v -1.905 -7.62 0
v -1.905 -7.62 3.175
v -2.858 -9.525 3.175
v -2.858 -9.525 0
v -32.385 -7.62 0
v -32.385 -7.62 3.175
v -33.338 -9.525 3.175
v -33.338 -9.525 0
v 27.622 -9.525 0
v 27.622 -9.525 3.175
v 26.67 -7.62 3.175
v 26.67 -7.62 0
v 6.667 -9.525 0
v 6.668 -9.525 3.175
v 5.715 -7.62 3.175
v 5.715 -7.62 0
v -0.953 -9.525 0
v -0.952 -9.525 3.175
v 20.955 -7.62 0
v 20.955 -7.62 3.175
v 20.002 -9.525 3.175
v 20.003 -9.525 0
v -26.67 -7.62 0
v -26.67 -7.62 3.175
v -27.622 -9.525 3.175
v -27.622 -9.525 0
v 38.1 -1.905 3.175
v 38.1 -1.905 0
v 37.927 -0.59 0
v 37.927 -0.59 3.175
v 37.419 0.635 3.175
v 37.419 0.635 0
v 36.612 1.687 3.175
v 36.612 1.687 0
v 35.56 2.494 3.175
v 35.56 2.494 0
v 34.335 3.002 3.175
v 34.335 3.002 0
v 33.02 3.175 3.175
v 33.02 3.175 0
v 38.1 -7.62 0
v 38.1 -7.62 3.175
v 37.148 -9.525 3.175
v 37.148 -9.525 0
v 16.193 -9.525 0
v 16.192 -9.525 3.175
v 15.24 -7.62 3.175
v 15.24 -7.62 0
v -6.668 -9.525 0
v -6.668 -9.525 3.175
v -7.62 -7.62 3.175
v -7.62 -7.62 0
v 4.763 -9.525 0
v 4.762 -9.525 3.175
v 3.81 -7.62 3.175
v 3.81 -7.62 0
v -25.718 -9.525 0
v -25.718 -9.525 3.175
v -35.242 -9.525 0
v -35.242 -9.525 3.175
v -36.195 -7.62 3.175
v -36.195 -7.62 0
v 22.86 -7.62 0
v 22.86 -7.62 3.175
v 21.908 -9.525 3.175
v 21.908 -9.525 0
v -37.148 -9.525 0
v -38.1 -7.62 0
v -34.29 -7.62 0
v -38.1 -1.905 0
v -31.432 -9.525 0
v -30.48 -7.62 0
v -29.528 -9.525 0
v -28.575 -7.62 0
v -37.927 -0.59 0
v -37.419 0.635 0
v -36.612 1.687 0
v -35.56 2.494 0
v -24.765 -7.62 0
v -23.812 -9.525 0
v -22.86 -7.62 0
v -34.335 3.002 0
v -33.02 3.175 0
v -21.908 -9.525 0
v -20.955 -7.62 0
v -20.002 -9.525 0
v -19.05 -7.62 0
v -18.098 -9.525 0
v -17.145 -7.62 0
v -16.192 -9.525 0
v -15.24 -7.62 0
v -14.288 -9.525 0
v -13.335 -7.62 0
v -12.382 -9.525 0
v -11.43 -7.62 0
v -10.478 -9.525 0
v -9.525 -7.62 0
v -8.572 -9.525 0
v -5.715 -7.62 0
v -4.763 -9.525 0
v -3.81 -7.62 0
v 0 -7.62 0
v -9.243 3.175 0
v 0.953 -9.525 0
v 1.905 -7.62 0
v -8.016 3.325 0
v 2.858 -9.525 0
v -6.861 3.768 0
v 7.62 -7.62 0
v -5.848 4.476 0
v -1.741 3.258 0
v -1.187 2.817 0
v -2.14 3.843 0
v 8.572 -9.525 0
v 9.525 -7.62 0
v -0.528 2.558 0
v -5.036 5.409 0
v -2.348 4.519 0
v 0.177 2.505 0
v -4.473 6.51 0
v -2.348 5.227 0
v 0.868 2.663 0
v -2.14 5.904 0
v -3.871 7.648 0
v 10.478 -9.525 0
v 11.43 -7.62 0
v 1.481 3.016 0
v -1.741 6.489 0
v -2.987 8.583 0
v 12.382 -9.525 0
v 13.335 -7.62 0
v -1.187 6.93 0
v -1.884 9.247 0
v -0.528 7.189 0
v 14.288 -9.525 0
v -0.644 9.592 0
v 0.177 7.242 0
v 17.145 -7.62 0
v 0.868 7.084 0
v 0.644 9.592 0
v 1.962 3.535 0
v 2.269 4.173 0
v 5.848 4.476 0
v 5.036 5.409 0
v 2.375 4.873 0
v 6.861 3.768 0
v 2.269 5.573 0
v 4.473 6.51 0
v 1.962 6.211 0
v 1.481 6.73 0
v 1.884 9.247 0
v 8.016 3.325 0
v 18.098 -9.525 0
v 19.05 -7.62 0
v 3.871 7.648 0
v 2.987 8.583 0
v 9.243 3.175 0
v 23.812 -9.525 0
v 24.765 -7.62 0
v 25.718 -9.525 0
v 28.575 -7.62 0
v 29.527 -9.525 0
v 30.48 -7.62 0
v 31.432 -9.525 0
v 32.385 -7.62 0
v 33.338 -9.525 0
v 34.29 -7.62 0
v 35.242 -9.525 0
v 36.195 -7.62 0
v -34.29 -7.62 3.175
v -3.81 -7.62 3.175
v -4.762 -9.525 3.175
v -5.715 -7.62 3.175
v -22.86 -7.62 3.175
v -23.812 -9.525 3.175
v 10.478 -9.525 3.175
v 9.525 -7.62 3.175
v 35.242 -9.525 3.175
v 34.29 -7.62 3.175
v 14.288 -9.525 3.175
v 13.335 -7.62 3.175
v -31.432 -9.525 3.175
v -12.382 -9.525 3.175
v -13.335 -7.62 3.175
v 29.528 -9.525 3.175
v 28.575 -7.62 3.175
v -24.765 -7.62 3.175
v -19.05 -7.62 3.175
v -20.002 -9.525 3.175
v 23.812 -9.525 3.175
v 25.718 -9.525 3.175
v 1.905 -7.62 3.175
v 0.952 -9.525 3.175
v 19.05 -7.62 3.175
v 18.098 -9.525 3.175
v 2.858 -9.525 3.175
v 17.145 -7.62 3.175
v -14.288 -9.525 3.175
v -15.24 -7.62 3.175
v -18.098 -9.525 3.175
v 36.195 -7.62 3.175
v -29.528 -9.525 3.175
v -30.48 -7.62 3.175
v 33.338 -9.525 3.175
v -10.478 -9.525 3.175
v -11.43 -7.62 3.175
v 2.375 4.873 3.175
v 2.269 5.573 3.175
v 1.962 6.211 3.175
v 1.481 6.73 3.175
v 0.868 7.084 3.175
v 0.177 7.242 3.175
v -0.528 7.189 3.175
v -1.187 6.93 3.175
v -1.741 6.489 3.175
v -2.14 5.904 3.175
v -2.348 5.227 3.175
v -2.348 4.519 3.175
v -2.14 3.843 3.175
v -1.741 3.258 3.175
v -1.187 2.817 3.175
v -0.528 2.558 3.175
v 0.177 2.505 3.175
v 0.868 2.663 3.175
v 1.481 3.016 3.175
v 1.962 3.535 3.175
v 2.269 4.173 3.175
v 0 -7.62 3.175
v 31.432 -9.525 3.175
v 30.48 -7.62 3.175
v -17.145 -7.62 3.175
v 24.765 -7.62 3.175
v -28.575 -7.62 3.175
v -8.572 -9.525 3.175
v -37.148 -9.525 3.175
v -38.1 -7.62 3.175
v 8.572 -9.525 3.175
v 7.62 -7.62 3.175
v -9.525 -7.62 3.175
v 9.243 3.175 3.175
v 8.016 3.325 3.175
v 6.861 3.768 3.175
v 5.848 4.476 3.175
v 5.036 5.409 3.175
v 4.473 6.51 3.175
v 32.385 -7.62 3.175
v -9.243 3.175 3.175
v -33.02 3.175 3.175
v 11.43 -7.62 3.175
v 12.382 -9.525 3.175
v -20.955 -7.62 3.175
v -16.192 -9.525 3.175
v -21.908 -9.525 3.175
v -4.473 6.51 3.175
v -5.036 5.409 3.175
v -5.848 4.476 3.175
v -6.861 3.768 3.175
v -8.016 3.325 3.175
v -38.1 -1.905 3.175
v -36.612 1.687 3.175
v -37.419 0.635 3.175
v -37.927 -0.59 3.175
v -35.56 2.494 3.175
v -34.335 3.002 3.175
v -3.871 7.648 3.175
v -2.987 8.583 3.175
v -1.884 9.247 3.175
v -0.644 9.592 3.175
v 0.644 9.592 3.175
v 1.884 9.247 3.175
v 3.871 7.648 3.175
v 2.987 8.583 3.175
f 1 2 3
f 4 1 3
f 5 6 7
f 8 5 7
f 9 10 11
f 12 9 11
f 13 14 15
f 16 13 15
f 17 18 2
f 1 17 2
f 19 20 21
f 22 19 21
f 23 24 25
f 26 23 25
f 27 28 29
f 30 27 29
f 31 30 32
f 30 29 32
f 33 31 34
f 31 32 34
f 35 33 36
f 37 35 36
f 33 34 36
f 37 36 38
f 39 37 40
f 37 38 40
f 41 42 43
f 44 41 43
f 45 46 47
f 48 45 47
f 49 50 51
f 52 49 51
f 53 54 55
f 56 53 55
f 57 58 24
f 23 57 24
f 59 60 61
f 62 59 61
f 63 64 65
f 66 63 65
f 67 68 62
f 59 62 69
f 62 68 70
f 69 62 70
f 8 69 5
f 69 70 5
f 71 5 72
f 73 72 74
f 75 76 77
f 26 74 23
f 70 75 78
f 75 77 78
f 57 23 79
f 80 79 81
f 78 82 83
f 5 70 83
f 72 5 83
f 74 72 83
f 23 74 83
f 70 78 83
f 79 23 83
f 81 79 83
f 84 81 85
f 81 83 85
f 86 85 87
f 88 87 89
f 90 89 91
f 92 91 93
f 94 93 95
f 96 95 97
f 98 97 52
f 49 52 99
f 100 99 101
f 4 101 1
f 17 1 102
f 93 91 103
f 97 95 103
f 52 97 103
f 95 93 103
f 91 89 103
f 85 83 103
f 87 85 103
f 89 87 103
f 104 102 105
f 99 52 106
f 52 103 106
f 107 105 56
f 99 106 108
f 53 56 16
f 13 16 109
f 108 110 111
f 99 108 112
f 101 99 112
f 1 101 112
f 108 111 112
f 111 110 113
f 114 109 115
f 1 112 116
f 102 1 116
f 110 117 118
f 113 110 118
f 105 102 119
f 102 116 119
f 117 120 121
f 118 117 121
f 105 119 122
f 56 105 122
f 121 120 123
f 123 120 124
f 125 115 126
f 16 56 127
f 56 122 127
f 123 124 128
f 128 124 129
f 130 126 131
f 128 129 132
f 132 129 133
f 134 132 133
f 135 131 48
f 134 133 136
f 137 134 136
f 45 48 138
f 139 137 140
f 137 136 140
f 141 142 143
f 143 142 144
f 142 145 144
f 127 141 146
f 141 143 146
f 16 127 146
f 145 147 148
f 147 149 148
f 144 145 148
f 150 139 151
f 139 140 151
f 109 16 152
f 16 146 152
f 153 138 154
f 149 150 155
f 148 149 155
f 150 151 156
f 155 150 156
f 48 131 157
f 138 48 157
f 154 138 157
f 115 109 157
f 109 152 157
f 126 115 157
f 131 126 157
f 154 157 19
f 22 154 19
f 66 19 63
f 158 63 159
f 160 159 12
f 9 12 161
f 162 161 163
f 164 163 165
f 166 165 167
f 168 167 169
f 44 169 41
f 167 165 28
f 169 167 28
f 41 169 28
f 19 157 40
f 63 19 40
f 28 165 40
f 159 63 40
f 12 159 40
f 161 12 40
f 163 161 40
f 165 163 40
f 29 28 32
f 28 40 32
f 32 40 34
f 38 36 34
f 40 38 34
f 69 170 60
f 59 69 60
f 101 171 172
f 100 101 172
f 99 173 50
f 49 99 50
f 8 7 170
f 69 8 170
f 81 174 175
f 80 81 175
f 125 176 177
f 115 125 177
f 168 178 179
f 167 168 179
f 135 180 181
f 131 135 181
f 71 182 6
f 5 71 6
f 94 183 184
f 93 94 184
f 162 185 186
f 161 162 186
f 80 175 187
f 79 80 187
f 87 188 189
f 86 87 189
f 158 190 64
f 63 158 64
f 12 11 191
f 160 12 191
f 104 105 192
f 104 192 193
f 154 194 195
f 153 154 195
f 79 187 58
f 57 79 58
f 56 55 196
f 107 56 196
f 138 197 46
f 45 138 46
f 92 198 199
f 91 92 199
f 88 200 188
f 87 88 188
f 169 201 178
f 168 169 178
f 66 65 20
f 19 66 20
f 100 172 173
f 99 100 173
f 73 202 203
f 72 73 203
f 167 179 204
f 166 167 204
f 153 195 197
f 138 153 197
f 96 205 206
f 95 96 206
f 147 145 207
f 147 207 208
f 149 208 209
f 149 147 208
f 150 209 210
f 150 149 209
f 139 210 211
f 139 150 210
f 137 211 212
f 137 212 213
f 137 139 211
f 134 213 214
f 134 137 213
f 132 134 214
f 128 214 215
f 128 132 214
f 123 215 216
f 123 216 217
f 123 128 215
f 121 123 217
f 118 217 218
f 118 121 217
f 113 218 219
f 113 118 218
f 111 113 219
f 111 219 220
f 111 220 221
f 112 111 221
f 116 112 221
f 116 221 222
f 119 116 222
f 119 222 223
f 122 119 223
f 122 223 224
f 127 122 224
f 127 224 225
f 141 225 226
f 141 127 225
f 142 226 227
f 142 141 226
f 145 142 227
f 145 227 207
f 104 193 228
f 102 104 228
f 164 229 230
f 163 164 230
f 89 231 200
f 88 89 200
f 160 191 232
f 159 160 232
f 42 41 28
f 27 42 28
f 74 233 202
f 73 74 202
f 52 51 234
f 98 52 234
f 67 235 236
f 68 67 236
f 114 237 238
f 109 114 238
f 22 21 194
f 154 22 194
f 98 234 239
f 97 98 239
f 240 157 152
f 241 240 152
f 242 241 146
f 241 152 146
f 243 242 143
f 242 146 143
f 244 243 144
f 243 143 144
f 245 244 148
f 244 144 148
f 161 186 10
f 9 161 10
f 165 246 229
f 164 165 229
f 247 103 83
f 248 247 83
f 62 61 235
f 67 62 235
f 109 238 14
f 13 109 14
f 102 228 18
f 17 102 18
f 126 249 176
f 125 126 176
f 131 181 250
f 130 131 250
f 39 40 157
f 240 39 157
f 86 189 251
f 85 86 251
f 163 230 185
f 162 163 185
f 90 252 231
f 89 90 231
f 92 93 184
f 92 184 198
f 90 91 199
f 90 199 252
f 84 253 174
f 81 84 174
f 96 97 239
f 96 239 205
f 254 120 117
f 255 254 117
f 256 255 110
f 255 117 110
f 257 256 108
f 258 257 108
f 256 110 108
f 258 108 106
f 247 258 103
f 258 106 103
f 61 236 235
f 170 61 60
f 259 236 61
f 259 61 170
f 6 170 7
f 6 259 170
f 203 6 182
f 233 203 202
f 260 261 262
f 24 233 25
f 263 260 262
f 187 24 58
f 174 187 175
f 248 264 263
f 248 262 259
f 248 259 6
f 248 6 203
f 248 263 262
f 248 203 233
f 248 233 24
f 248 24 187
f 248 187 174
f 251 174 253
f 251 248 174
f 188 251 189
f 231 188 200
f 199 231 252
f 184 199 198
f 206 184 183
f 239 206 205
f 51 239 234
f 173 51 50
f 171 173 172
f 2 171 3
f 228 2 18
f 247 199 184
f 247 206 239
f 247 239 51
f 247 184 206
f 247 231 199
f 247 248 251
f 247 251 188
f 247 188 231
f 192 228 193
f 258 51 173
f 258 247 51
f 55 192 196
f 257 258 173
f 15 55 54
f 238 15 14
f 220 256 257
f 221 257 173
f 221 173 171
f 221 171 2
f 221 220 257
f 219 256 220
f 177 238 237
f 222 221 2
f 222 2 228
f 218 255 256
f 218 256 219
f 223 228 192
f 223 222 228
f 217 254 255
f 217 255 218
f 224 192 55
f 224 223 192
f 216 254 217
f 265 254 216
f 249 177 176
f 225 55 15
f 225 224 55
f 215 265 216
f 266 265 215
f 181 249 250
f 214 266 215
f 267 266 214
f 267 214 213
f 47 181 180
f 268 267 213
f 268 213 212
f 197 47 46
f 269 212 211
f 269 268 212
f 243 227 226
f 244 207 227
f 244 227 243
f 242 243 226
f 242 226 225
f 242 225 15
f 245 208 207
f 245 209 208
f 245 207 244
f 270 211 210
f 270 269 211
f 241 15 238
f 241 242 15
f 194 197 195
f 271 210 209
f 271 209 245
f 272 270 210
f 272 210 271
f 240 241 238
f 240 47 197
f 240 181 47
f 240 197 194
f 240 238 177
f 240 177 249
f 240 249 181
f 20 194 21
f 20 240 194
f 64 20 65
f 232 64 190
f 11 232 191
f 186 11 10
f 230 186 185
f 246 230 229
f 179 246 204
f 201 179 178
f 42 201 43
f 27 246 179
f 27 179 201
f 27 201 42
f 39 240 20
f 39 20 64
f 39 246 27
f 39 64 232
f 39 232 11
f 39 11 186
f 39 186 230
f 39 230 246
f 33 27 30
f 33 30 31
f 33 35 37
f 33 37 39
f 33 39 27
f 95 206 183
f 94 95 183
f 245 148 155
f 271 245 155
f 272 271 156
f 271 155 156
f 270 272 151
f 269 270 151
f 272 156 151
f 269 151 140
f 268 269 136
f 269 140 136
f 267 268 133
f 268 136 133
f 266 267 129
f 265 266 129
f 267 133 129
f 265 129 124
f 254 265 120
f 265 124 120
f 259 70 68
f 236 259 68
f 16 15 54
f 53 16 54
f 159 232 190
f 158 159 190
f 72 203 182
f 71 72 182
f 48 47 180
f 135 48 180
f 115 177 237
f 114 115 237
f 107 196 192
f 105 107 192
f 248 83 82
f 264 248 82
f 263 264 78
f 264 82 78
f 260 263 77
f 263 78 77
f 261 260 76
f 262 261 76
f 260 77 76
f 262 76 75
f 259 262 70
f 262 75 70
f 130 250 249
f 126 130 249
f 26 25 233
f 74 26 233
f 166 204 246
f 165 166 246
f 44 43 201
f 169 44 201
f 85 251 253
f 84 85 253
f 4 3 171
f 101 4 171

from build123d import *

# Parameters (mm, degrees)
F0_R     = 2.3749
F1_DEPTH = 3.175
F3_DEPTH = 25.4


with BuildPart() as f1:
    # F0 (on Top) → F1 (new body)
    with BuildSketch(Plane.XY):
        with BuildLine():
            Line((-38.1, -9.525), (38.1, -9.525))
            Line((38.1, -9.525), (38.1, -1.905))
            ThreePointArc((38.1, -1.905), (36.612102, 1.687102), (33.02, 3.175))
            Line((33.02, 3.175), (9.243306, 3.175))
            ThreePointArc((9.243306, 3.175), (6.333003, 4.091283), (4.472567, 6.509591))
            ThreePointArc((4.472567, 6.509591), (0, 9.635769), (-4.472567, 6.509591))
            ThreePointArc((-4.472567, 6.509591), (-6.333003, 4.091283), (-9.243306, 3.175))
            Line((-9.243306, 3.175), (-33.02, 3.175))
            ThreePointArc((-33.02, 3.175), (-36.612102, 1.687102), (-38.1, -1.905))
            Line((-38.1, -1.905), (-38.1, -9.525))
        make_face()
        with Locations((0, 4.873269)):
            Circle(F0_R, mode=Mode.SUBTRACT)
    extrude(amount=F1_DEPTH)

    # F2 (on face) → F3 (cut)
    with BuildSketch(Plane.XY.offset(3.175)):
        Polygon((-38.1, -7.62), (-38.1, -14.148636), (38.1, -14.148636), (38.1, -7.62), (37.1475, -9.525), (36.195, -7.62), (35.2425, -9.525), (34.29, -7.62), (33.3375, -9.525), (32.385, -7.62), (31.4325, -9.525), (30.48, -7.62), (29.5275, -9.525), (28.575, -7.62), (27.6225, -9.525), (26.67, -7.62), (25.7175, -9.525), (24.765, -7.62), (23.8125, -9.525), (22.86, -7.62), (21.9075, -9.525), (20.955, -7.62), (20.0025, -9.525), (19.05, -7.62), (18.0975, -9.525), (17.145, -7.62), (16.1925, -9.525), (15.24, -7.62), (14.2875, -9.525), (13.335, -7.62), (12.3825, -9.525), (11.43, -7.62), (10.4775, -9.525), (9.525, -7.62), (8.5725, -9.525), (7.62, -7.62), (6.6675, -9.525), (5.715, -7.62), (4.7625, -9.525), (3.81, -7.62), (2.8575, -9.525), (1.905, -7.62), (0.9525, -9.525), (0, -7.62), (-0.9525, -9.525), (-1.905, -7.62), (-2.8575, -9.525), (-3.81, -7.62), (-4.7625, -9.525), (-5.715, -7.62), (-6.6675, -9.525), (-7.62, -7.62), (-8.5725, -9.525), (-9.525, -7.62), (-10.4775, -9.525), (-11.43, -7.62), (-12.3825, -9.525), (-13.335, -7.62), (-14.2875, -9.525), (-15.24, -7.62), (-16.1925, -9.525), (-17.145, -7.62), (-18.0975, -9.525), (-19.05, -7.62), (-20.0025, -9.525), (-20.955, -7.62), (-21.9075, -9.525), (-22.86, -7.62), (-23.8125, -9.525), (-24.765, -7.62), (-25.7175, -9.525), (-26.67, -7.62), (-27.6225, -9.525), (-28.575, -7.62), (-29.5275, -9.525), (-30.48, -7.62), (-31.4325, -9.525), (-32.385, -7.62), (-33.3375, -9.525), (-34.29, -7.62), (-35.2425, -9.525), (-36.195, -7.62), (-37.1475, -9.525), align=None)
    extrude(amount=-F3_DEPTH, mode=Mode.SUBTRACT)


solid = f1.part
